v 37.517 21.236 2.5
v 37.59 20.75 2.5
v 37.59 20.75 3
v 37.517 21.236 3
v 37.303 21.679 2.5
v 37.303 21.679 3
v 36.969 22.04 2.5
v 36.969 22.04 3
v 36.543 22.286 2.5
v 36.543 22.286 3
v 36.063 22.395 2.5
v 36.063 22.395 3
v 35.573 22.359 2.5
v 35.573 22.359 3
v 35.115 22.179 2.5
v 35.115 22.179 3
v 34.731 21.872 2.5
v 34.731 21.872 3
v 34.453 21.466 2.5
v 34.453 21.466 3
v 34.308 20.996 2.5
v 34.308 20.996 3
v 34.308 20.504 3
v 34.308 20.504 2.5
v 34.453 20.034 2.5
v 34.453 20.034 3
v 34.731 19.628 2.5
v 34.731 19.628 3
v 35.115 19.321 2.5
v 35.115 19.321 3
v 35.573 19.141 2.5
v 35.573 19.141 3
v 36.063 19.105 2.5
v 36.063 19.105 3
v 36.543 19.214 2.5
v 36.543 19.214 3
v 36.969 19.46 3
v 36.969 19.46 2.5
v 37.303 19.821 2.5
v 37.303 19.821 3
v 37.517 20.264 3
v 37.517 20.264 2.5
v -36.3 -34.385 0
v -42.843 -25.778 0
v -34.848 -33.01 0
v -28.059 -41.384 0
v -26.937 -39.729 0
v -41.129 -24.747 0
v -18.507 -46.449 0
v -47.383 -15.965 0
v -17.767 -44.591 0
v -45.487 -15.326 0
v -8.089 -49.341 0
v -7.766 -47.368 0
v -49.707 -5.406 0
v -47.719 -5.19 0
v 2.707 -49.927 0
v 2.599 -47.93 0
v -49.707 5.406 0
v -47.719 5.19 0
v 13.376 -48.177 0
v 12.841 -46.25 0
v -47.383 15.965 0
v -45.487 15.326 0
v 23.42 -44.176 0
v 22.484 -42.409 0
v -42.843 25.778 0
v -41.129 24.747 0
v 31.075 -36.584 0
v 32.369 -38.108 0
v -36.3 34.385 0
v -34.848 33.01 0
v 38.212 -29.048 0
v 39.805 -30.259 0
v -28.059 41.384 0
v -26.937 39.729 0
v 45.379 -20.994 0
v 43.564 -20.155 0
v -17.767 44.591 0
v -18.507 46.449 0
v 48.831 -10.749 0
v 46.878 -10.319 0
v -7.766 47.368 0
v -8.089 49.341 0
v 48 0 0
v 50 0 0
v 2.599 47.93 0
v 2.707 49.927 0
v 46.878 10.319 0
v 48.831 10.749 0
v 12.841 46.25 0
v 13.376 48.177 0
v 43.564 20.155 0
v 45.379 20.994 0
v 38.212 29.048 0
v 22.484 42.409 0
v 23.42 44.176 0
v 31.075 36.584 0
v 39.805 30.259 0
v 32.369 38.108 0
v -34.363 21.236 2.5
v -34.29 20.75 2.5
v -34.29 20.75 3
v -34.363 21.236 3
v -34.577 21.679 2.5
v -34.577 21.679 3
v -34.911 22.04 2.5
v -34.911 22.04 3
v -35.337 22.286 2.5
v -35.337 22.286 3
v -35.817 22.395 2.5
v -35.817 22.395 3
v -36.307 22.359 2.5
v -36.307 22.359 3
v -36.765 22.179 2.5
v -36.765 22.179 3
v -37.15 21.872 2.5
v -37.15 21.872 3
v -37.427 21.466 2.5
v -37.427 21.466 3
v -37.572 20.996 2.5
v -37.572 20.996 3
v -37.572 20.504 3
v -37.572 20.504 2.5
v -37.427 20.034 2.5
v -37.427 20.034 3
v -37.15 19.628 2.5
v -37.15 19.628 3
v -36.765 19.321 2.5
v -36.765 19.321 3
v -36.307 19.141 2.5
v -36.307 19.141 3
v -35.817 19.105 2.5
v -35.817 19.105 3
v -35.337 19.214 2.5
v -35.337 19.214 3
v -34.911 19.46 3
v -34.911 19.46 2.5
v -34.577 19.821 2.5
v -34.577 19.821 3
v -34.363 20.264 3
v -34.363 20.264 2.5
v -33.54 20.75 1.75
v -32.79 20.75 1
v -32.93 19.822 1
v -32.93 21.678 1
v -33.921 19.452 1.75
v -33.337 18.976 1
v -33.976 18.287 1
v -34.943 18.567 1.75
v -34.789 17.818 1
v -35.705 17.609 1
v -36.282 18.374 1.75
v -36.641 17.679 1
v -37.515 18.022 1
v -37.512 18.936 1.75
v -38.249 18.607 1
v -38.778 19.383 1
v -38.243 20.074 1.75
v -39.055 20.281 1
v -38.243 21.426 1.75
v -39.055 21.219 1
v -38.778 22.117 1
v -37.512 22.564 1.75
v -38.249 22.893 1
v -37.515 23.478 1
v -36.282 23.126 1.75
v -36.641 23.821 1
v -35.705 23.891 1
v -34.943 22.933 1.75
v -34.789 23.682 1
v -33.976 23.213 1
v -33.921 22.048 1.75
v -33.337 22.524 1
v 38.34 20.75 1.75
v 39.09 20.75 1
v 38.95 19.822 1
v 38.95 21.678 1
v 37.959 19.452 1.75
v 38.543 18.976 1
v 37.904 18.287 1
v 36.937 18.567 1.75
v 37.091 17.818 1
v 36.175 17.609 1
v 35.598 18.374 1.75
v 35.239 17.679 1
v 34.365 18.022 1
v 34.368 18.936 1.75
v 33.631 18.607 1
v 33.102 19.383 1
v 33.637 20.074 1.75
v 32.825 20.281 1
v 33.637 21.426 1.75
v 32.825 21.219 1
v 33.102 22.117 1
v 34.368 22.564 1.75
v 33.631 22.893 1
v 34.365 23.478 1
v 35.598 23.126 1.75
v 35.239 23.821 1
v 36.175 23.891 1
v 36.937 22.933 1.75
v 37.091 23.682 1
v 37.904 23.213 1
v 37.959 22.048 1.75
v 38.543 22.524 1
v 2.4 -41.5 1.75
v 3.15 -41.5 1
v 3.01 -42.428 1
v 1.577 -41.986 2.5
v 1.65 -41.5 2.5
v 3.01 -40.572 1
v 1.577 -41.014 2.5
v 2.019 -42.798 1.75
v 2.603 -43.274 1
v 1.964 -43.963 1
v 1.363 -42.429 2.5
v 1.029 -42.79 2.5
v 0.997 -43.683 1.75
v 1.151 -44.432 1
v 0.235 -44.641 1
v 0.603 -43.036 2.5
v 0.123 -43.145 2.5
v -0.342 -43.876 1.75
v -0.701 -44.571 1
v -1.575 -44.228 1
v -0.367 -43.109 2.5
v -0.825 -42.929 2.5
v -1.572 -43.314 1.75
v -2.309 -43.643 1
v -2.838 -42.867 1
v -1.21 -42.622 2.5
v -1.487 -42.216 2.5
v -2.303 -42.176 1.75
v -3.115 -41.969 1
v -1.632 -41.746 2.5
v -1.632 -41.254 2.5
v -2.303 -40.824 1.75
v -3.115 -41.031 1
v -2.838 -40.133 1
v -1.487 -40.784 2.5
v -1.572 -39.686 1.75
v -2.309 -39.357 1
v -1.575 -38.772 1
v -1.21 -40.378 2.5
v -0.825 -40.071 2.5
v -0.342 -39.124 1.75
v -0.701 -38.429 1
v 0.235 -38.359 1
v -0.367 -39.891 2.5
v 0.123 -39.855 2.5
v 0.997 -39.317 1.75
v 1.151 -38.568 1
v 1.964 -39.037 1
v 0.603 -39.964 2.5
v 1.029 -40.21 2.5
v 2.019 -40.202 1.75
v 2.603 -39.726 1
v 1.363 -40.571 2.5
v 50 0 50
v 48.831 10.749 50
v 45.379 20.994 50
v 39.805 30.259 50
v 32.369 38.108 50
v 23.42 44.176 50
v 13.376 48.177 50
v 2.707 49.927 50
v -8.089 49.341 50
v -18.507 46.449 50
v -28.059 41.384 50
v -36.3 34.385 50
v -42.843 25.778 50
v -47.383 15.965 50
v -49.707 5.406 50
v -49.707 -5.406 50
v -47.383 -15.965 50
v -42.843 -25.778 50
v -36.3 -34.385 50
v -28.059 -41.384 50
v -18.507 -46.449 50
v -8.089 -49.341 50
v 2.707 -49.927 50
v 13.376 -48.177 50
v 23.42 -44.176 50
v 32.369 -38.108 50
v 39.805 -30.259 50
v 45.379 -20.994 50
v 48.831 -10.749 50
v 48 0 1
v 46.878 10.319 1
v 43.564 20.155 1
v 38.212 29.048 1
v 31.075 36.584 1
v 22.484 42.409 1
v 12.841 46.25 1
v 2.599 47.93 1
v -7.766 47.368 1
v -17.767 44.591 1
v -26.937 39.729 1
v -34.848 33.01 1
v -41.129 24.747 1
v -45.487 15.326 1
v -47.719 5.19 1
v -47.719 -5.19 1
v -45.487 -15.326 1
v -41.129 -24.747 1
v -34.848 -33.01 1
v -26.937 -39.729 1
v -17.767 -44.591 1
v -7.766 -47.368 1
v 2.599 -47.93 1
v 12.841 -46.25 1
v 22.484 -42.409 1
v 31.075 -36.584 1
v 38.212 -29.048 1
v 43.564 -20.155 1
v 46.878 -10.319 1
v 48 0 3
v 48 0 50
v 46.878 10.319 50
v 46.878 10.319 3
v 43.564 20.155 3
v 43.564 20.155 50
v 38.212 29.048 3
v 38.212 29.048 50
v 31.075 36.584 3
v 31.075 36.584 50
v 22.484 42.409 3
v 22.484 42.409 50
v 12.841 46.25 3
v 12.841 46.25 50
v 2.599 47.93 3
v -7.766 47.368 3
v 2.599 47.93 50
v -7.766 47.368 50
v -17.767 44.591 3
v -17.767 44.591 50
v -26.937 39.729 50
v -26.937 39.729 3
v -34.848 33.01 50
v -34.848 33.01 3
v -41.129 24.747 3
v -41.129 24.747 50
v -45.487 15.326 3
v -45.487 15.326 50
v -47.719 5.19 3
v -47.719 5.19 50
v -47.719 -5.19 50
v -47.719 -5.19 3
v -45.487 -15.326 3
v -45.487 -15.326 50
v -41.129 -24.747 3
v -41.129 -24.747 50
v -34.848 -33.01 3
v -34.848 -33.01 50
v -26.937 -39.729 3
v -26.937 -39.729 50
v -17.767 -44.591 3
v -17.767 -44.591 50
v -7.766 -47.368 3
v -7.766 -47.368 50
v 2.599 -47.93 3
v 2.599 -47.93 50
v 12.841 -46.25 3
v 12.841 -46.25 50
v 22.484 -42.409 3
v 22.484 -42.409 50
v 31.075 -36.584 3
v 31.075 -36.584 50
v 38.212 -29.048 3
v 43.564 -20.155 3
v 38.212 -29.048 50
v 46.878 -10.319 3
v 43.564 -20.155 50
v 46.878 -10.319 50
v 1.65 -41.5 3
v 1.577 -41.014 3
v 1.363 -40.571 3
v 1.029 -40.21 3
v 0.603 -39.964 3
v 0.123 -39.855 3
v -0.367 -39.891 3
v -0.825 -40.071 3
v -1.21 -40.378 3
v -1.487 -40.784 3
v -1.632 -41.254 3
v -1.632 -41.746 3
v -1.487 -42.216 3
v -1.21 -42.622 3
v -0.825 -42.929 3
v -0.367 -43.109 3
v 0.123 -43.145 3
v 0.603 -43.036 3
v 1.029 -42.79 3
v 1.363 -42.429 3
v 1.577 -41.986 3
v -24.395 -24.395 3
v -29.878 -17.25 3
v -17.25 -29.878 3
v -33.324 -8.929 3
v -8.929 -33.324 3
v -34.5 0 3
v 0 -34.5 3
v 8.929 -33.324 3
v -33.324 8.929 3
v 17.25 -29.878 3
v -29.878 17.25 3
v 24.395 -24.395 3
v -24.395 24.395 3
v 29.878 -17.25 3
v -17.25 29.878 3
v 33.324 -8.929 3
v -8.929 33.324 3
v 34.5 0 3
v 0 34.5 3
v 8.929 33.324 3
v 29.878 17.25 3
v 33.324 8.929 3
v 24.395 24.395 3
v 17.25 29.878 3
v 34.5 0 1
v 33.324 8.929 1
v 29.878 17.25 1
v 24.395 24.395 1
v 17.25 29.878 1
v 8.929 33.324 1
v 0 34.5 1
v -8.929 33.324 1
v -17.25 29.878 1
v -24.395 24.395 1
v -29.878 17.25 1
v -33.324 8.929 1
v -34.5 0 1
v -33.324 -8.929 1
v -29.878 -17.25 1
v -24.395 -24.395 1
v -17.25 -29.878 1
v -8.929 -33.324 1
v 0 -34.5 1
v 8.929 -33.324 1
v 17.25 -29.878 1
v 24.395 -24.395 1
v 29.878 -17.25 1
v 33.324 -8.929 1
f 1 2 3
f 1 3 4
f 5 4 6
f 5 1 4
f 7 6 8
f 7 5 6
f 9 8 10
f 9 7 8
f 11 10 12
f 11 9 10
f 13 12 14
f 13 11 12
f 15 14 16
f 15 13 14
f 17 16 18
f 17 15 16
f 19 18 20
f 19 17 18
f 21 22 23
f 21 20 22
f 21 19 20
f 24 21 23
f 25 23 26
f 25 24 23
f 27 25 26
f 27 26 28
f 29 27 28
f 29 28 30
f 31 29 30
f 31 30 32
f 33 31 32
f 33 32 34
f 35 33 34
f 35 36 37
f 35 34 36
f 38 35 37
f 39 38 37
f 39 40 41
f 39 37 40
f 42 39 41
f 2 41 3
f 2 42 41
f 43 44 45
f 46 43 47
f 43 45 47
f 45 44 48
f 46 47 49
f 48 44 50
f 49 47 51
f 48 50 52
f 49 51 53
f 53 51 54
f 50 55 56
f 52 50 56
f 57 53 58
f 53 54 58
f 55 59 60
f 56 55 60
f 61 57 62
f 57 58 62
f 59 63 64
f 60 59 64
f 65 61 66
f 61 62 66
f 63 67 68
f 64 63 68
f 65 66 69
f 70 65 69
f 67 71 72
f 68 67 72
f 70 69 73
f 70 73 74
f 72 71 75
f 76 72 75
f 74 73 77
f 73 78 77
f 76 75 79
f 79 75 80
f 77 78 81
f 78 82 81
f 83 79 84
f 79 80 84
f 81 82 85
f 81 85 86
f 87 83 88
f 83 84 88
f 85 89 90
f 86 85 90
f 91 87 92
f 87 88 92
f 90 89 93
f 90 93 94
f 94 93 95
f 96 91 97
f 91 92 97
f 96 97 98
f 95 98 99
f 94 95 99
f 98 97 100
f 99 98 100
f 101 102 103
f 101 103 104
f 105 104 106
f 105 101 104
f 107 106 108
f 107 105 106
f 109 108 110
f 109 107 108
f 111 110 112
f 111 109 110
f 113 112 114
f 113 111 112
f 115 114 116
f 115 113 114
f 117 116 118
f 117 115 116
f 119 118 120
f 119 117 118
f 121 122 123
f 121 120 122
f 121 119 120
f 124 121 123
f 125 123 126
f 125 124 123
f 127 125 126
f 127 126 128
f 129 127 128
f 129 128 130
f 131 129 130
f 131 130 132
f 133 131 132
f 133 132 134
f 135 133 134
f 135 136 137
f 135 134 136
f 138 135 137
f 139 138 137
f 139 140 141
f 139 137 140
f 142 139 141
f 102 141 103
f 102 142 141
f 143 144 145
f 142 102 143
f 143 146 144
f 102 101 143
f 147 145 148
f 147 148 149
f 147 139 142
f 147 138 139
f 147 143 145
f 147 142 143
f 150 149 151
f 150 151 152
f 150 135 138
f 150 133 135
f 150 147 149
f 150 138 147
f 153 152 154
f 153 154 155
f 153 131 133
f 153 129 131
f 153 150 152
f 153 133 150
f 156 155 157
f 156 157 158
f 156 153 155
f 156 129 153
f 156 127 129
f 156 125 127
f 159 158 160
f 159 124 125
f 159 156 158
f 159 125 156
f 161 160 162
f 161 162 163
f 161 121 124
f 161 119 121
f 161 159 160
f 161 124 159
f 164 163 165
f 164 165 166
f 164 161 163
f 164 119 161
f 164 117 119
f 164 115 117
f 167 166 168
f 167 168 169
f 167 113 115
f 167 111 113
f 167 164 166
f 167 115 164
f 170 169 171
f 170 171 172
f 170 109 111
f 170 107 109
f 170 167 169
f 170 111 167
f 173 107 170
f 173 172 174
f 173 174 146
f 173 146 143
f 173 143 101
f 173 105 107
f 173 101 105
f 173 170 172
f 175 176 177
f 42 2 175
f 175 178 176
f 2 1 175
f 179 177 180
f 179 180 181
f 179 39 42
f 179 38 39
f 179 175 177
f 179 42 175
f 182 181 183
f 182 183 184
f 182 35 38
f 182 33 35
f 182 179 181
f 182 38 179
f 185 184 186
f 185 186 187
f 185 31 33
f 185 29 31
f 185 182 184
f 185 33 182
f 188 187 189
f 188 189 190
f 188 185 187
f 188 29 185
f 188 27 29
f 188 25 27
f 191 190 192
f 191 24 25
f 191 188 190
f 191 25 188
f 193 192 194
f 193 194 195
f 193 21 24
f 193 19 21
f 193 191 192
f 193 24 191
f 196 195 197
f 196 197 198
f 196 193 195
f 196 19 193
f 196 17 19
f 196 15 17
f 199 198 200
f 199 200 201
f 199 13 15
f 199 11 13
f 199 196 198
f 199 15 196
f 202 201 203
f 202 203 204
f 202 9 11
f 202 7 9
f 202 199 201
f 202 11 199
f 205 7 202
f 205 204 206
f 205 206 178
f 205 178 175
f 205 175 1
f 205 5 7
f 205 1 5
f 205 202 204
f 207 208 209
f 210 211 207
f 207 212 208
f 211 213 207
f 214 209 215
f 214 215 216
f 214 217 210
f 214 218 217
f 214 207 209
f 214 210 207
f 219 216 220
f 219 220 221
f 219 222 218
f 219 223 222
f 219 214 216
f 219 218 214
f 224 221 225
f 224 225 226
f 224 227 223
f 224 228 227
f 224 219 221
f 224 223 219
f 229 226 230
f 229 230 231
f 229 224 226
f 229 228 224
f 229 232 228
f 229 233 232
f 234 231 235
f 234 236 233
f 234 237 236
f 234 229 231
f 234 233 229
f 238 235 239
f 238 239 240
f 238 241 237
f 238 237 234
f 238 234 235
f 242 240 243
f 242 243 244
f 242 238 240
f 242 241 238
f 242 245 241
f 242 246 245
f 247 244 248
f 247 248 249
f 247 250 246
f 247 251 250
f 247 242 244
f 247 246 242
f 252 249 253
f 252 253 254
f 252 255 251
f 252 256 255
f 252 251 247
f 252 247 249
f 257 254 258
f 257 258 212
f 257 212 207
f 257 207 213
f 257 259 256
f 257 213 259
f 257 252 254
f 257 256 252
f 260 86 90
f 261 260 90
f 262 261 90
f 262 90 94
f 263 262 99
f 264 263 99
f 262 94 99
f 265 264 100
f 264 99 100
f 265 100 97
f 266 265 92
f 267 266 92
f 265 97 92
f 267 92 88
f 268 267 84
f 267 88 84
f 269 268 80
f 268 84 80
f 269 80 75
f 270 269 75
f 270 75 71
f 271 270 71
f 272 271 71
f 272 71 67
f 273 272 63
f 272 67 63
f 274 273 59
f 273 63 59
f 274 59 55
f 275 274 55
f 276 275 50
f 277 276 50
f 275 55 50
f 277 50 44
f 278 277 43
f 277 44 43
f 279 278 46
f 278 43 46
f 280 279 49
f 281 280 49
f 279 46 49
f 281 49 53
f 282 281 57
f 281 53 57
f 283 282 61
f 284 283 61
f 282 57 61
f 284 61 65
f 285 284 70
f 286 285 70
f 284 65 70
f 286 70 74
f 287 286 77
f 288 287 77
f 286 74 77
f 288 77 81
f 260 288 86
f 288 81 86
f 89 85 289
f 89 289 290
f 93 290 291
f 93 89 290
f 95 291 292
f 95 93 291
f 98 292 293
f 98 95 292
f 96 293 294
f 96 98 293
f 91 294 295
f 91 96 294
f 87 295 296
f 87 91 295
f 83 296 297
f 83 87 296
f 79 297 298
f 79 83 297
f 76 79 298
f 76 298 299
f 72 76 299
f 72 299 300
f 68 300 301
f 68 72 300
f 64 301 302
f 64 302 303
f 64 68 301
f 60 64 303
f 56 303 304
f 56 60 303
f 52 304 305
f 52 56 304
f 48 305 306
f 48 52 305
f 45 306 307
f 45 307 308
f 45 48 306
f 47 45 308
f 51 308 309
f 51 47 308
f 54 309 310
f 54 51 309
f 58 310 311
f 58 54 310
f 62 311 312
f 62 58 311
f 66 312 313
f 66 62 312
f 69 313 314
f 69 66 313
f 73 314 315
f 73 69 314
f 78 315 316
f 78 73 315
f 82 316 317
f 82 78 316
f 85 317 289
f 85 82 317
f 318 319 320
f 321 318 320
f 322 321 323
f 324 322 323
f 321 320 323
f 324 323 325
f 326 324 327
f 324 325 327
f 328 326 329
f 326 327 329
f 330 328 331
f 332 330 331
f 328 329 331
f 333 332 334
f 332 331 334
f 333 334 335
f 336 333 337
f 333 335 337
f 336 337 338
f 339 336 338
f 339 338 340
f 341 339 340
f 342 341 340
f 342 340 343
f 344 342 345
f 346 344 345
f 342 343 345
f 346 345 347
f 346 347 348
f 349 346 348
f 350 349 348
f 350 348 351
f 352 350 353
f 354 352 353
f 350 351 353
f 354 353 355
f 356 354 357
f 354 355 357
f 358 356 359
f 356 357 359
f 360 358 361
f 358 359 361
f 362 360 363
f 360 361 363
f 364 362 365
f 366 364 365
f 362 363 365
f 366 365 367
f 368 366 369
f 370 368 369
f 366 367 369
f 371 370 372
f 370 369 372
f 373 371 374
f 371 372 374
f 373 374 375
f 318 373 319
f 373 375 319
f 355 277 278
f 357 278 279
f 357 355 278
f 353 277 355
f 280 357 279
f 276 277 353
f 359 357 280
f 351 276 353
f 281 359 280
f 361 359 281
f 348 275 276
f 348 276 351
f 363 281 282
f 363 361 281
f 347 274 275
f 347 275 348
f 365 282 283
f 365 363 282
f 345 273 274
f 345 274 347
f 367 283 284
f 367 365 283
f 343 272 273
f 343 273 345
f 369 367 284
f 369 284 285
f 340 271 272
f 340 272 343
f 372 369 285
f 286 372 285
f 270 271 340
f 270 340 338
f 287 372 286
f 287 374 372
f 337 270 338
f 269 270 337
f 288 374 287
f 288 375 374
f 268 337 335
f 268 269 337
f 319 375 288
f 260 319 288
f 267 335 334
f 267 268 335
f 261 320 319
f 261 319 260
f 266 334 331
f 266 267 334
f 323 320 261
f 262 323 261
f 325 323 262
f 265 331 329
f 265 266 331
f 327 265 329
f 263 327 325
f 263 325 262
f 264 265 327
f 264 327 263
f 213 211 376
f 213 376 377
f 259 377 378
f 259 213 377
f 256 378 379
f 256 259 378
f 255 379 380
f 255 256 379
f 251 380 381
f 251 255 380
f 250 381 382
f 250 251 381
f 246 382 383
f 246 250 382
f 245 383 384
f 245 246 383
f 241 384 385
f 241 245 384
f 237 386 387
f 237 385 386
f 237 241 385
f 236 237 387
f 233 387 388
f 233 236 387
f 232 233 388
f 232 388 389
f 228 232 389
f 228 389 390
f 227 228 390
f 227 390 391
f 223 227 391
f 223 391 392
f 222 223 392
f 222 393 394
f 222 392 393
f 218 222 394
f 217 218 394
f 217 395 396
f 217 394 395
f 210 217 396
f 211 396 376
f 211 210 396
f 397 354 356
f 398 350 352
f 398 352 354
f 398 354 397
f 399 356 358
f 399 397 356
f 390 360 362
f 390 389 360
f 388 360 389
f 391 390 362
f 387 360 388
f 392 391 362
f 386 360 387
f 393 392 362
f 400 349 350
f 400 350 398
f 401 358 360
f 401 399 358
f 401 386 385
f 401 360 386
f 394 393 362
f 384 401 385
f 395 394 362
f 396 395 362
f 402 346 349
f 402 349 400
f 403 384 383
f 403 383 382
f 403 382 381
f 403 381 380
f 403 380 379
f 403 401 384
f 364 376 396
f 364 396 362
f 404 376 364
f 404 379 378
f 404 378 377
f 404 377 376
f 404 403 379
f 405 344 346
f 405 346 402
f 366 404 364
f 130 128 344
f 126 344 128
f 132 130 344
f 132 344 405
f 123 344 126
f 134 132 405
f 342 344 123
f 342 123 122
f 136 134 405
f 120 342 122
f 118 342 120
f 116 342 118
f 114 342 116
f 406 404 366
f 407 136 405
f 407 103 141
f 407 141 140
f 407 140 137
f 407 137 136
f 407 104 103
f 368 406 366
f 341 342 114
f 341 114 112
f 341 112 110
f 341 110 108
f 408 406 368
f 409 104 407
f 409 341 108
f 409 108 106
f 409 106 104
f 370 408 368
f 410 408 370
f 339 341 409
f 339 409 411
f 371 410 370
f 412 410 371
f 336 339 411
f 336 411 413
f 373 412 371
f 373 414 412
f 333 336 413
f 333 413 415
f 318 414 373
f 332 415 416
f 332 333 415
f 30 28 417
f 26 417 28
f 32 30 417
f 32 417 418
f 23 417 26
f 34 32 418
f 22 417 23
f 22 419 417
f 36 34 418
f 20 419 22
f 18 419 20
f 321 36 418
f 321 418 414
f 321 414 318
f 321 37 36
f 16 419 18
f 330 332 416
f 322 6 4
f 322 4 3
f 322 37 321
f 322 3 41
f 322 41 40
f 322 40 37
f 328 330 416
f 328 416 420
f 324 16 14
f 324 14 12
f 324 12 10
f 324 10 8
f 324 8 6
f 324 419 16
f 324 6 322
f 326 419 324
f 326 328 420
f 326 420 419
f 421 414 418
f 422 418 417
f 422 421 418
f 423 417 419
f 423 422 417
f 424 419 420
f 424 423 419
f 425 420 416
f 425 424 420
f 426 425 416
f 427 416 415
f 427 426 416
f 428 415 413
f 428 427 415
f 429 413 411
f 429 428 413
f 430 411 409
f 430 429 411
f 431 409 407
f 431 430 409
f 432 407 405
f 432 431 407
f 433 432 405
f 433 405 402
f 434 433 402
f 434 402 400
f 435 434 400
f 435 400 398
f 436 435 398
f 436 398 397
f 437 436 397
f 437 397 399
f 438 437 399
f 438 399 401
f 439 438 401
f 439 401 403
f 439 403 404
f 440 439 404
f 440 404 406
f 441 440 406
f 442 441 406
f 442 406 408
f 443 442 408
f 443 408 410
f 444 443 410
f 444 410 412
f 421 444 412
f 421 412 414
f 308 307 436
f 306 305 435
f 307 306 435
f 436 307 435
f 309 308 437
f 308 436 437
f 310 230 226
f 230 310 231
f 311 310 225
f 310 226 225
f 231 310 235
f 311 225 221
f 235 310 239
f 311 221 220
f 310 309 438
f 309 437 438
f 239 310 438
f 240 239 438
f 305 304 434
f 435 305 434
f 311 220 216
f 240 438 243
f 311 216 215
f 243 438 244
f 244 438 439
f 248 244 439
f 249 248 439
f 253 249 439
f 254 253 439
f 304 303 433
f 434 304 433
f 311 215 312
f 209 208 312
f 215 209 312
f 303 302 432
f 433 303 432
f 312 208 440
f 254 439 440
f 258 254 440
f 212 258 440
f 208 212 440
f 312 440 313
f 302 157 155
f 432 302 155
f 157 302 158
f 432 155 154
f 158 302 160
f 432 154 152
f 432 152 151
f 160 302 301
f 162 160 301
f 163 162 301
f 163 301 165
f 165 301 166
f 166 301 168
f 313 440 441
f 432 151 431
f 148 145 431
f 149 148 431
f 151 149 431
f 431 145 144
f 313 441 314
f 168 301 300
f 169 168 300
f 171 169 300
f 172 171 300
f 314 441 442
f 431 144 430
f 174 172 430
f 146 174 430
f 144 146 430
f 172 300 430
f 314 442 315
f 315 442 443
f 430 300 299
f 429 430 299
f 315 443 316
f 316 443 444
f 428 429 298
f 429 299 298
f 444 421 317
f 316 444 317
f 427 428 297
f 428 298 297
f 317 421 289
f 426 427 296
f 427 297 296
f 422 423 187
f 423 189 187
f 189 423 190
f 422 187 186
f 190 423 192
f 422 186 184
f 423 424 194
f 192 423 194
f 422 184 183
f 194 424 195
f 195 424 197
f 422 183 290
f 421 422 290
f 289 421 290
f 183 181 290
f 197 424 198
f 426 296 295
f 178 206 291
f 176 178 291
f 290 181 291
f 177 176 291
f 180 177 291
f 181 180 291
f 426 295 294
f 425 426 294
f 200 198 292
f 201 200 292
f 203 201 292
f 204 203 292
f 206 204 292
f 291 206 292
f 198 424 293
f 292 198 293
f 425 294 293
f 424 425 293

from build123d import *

# Parameters (mm, degrees)
F0_R      = 50
F3_DEPTH  = 50
F2_R      = 48
F4_DEPTH  = 47
F5_R      = 34.5
F6_DEPTH  = 3
F7_R      = 48
F8_DEPTH  = 1
F9_R      = 1.65
F10_DEPTH = 25
F12_SIZE  = 1.5


with BuildPart() as f3:
    # F0 (on Top) → F3 (new body)
    with BuildSketch(Plane.XY):
        Circle(F0_R)
    extrude(amount=F3_DEPTH)

    # F2 (on offset) → F4 (cut)
    with BuildSketch(Plane.XY.offset(50)):
        Circle(F2_R)
    extrude(amount=-F4_DEPTH, mode=Mode.SUBTRACT)

    # F5 (on Top) → F6 (cut)
    with BuildSketch(Plane.XY):
        Circle(F5_R)
    extrude(amount=F6_DEPTH, mode=Mode.SUBTRACT)

    # F7 (on Top) → F8 (cut)
    with BuildSketch(Plane.XY):
        Circle(F7_R)
    extrude(amount=F8_DEPTH, mode=Mode.SUBTRACT)

    # F9 (on Top) → F10 (cut)
    with BuildSketch(Plane.XY):
        with Locations((0, -41.5)):
            Circle(F9_R)
        with Locations((35.9400542571, 20.75)):
            Circle(F9_R)
        with Locations((-35.9400542571, 20.75)):
            Circle(F9_R)
    extrude(amount=F10_DEPTH, mode=Mode.SUBTRACT)

    # F12
    f12_edges = [f3.edges().sort_by_distance(p)[0] for p in [
        (-37.590054, 20.75, 1),
        (-1.65, -41.5, 1),
        (34.290054, 20.75, 1),
    ]]
    chamfer(f12_edges, length=F12_SIZE)


solid = f3.part
